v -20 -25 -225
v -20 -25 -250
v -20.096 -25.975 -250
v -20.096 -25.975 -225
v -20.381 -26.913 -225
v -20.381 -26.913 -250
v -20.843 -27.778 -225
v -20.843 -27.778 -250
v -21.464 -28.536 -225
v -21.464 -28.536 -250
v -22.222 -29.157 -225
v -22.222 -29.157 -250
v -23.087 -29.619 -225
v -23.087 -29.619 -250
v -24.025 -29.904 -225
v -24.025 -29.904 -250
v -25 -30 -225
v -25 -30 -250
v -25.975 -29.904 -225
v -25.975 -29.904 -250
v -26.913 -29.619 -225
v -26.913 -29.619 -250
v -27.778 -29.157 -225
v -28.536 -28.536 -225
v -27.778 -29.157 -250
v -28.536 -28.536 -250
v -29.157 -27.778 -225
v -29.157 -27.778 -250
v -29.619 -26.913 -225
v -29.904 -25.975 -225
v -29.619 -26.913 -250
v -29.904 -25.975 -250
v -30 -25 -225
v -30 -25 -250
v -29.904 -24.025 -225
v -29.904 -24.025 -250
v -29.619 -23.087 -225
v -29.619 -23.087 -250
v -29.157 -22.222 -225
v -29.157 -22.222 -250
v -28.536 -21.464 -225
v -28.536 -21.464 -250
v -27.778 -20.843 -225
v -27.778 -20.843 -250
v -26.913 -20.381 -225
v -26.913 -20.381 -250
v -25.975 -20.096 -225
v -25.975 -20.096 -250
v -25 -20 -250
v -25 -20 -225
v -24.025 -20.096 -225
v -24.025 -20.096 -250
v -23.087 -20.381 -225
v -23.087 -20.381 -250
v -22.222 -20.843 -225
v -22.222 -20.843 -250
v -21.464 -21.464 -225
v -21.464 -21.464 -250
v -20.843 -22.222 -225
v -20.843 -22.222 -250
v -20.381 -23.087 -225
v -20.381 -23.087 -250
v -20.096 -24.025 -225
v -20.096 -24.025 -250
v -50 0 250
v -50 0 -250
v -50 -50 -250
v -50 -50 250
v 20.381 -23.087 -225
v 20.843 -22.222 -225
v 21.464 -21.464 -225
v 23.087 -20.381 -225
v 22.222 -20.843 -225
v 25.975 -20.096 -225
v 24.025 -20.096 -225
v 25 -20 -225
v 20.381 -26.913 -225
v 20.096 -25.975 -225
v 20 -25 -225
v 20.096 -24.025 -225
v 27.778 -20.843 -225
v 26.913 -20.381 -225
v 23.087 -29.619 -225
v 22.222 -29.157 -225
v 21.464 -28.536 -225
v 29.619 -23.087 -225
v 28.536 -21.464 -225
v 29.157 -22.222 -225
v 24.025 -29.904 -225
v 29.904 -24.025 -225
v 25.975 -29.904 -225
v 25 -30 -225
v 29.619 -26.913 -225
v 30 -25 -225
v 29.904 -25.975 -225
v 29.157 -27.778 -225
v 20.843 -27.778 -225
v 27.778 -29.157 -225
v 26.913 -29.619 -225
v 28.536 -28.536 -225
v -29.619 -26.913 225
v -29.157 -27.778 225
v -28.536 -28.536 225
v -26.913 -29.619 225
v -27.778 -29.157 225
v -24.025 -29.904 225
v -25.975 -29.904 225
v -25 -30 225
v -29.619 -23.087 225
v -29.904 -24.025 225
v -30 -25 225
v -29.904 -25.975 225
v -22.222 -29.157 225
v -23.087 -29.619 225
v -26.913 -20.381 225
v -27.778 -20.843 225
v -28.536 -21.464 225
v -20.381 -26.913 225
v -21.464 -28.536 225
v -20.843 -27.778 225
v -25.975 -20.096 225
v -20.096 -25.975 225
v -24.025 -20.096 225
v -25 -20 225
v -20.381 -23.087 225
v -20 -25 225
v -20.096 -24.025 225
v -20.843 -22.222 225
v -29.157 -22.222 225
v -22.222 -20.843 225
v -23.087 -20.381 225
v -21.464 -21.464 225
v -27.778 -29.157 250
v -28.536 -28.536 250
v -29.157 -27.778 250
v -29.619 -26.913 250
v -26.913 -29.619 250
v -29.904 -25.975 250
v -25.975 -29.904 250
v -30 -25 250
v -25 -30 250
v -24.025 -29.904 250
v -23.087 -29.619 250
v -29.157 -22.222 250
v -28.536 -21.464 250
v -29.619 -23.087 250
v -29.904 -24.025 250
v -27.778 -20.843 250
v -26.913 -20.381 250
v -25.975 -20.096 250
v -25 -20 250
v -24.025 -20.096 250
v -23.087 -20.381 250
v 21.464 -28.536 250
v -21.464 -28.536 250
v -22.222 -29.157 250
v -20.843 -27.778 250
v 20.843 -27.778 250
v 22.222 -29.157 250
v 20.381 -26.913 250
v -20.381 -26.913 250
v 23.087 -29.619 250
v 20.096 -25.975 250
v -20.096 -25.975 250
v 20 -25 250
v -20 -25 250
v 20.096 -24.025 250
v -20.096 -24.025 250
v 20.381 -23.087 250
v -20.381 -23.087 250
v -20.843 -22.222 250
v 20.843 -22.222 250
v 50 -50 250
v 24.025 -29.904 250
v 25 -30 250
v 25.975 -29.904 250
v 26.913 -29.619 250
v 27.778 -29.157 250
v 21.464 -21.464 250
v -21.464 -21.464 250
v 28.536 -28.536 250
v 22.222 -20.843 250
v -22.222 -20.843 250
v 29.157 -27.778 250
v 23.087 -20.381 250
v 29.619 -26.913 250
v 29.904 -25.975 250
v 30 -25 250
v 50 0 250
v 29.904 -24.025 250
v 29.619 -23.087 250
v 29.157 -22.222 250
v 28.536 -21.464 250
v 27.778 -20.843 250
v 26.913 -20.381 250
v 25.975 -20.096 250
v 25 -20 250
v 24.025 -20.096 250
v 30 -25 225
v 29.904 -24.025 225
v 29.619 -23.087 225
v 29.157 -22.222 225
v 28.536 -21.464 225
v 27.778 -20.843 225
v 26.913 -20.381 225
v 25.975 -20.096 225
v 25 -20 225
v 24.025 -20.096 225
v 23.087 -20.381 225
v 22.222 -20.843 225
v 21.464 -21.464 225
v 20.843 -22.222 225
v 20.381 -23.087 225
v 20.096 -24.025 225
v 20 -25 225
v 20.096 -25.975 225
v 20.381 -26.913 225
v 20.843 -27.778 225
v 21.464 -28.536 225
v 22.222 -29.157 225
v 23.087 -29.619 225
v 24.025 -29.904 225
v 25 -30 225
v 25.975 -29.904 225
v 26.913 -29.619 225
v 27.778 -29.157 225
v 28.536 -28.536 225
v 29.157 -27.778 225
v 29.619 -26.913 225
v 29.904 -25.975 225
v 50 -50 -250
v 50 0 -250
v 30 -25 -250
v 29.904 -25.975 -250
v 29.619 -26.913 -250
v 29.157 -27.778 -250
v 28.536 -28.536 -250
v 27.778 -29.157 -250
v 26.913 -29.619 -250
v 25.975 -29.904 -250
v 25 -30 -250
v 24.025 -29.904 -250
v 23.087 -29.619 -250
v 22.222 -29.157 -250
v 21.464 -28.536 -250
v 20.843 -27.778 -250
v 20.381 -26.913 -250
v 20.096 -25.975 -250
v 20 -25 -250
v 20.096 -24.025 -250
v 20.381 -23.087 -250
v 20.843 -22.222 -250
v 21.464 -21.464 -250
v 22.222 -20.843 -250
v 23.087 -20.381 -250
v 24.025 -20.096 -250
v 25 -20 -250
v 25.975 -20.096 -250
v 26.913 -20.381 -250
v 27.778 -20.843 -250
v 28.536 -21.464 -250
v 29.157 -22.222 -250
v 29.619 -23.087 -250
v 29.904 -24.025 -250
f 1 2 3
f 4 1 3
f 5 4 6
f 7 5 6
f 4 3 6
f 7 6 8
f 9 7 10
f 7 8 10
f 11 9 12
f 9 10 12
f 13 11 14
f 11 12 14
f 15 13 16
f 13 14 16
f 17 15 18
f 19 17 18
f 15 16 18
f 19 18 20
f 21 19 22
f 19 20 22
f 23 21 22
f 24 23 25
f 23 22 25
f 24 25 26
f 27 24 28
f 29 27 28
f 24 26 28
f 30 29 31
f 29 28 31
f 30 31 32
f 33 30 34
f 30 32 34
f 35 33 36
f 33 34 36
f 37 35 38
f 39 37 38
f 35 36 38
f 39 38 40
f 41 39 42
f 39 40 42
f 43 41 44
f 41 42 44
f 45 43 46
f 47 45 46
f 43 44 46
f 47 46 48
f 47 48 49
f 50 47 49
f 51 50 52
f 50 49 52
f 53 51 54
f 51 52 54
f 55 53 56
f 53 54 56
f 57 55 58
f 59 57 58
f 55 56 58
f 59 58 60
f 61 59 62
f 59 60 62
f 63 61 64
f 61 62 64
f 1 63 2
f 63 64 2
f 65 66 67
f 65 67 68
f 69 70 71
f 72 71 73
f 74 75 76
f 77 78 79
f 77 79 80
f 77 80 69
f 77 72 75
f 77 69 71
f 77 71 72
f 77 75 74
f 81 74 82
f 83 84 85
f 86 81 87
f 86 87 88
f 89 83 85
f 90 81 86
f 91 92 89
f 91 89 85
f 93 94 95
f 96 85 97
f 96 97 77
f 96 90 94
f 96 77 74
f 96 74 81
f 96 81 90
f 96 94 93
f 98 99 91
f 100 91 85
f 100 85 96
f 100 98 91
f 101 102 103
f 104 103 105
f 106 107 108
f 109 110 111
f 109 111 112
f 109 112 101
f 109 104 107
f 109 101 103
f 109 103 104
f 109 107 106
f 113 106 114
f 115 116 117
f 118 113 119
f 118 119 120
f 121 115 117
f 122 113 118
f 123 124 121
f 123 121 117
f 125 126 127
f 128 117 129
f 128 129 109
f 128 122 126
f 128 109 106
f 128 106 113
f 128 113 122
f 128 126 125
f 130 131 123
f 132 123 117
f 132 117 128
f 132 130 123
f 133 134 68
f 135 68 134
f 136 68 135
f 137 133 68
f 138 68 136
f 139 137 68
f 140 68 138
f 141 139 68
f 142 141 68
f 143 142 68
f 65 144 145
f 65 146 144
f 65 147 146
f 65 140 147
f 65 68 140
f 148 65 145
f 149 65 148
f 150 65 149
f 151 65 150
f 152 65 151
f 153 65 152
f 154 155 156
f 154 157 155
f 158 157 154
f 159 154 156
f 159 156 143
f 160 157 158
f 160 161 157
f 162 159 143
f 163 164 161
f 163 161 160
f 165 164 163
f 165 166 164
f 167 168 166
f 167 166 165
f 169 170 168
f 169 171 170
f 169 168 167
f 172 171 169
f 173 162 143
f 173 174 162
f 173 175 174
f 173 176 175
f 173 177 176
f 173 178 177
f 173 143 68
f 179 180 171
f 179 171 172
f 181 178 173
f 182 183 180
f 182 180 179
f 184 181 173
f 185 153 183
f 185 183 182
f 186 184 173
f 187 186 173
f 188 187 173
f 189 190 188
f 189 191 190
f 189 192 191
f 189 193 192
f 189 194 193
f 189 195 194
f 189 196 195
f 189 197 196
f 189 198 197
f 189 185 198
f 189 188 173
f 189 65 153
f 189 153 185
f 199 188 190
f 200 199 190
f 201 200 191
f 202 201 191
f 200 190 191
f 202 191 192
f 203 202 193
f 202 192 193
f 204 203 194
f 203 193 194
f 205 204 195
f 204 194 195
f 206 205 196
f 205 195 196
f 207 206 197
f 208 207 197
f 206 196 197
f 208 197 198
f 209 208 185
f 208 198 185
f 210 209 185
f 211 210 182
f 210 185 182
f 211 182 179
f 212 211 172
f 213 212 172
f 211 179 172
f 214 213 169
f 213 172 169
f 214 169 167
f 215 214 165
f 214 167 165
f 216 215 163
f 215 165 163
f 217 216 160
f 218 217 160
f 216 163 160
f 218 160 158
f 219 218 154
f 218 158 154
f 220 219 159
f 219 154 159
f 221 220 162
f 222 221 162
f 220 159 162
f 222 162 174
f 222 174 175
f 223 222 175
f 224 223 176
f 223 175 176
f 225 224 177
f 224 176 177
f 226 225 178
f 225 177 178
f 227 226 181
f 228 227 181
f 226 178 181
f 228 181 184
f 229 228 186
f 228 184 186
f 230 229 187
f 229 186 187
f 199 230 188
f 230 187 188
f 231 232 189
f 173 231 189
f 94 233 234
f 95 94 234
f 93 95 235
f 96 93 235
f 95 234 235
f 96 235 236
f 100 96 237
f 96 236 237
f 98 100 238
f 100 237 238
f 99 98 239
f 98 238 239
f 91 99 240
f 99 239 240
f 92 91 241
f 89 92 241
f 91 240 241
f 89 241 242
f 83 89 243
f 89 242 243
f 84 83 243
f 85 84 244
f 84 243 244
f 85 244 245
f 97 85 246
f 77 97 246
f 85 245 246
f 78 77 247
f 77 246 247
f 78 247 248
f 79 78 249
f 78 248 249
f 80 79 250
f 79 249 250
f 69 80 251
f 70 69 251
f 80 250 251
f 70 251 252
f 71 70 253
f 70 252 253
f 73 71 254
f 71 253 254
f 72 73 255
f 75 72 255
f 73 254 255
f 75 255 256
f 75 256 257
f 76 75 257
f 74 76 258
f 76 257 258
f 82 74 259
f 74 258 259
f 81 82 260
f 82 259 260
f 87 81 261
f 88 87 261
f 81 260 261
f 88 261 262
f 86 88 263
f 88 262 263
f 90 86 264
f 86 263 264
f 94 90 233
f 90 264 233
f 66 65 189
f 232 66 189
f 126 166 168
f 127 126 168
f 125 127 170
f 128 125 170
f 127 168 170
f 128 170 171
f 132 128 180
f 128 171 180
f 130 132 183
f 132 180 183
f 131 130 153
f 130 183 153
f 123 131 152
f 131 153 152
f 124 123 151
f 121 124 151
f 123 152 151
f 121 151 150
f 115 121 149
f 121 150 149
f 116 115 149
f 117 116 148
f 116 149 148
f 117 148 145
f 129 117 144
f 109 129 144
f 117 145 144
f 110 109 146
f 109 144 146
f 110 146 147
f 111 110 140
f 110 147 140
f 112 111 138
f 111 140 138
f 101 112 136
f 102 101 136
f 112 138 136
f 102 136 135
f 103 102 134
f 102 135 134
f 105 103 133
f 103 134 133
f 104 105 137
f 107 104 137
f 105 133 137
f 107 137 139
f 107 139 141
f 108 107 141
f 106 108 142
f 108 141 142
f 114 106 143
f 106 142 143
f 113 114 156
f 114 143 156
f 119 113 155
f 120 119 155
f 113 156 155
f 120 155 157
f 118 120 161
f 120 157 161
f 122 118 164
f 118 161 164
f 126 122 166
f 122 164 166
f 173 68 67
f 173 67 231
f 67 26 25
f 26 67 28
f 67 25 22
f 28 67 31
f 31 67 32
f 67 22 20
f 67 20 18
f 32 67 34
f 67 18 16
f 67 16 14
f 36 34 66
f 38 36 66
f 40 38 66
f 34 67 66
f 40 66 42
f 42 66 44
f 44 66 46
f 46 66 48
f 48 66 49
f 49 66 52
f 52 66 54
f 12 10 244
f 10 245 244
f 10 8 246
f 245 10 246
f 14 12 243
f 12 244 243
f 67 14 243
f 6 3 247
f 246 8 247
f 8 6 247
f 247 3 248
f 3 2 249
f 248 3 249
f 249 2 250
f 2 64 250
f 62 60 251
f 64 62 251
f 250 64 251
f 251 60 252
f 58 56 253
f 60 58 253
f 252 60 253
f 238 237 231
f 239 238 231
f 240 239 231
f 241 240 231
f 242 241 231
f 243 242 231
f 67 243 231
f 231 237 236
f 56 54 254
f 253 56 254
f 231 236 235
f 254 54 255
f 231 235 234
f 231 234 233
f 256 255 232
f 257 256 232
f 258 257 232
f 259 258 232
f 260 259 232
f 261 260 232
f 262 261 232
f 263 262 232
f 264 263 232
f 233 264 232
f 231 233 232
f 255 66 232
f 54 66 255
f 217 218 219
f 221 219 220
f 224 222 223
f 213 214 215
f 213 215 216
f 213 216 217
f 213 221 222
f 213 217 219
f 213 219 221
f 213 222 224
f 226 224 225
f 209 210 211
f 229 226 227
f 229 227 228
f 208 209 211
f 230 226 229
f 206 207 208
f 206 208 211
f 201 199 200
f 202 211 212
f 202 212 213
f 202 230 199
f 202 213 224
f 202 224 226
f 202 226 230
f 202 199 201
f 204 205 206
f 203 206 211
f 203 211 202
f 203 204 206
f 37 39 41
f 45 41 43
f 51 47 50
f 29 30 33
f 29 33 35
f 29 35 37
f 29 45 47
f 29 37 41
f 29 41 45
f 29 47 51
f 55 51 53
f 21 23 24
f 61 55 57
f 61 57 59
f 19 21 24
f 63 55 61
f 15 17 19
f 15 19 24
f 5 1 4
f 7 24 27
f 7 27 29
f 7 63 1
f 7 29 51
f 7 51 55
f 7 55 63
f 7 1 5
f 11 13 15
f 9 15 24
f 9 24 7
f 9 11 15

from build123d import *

# Parameters (mm, degrees)
F0_W     = 100
F0_H     = 500
F1_DEPTH = 50
F2_R     = 5
F3_DEPTH = 25
F4_R     = 5
F5_DEPTH = 25


with BuildPart() as f1:
    # F0 (on Front) → F1 (new body)
    with BuildSketch(Plane.XZ):
        Rectangle(F0_W, F0_H)
    extrude(amount=F1_DEPTH)

    # F2 (on face) → F3 (cut)
    with BuildSketch(Plane.XY.offset(250)):
        with Locations((-25, -25)):
            Circle(F2_R)
        with Locations((25, -25)):
            Circle(F2_R)
    extrude(amount=-F3_DEPTH, mode=Mode.SUBTRACT)

    # F4 (on face) → F5 (cut)
    with BuildSketch(Plane(origin=(0, 0, -250), x_dir=(1, 0, 0), z_dir=(0, 0, -1))):
        with Locations((25, 25)):
            Circle(F4_R)
        with Locations((-25, 25)):
            Circle(F4_R)
    extrude(amount=-F5_DEPTH, mode=Mode.SUBTRACT)


solid = f1.part
